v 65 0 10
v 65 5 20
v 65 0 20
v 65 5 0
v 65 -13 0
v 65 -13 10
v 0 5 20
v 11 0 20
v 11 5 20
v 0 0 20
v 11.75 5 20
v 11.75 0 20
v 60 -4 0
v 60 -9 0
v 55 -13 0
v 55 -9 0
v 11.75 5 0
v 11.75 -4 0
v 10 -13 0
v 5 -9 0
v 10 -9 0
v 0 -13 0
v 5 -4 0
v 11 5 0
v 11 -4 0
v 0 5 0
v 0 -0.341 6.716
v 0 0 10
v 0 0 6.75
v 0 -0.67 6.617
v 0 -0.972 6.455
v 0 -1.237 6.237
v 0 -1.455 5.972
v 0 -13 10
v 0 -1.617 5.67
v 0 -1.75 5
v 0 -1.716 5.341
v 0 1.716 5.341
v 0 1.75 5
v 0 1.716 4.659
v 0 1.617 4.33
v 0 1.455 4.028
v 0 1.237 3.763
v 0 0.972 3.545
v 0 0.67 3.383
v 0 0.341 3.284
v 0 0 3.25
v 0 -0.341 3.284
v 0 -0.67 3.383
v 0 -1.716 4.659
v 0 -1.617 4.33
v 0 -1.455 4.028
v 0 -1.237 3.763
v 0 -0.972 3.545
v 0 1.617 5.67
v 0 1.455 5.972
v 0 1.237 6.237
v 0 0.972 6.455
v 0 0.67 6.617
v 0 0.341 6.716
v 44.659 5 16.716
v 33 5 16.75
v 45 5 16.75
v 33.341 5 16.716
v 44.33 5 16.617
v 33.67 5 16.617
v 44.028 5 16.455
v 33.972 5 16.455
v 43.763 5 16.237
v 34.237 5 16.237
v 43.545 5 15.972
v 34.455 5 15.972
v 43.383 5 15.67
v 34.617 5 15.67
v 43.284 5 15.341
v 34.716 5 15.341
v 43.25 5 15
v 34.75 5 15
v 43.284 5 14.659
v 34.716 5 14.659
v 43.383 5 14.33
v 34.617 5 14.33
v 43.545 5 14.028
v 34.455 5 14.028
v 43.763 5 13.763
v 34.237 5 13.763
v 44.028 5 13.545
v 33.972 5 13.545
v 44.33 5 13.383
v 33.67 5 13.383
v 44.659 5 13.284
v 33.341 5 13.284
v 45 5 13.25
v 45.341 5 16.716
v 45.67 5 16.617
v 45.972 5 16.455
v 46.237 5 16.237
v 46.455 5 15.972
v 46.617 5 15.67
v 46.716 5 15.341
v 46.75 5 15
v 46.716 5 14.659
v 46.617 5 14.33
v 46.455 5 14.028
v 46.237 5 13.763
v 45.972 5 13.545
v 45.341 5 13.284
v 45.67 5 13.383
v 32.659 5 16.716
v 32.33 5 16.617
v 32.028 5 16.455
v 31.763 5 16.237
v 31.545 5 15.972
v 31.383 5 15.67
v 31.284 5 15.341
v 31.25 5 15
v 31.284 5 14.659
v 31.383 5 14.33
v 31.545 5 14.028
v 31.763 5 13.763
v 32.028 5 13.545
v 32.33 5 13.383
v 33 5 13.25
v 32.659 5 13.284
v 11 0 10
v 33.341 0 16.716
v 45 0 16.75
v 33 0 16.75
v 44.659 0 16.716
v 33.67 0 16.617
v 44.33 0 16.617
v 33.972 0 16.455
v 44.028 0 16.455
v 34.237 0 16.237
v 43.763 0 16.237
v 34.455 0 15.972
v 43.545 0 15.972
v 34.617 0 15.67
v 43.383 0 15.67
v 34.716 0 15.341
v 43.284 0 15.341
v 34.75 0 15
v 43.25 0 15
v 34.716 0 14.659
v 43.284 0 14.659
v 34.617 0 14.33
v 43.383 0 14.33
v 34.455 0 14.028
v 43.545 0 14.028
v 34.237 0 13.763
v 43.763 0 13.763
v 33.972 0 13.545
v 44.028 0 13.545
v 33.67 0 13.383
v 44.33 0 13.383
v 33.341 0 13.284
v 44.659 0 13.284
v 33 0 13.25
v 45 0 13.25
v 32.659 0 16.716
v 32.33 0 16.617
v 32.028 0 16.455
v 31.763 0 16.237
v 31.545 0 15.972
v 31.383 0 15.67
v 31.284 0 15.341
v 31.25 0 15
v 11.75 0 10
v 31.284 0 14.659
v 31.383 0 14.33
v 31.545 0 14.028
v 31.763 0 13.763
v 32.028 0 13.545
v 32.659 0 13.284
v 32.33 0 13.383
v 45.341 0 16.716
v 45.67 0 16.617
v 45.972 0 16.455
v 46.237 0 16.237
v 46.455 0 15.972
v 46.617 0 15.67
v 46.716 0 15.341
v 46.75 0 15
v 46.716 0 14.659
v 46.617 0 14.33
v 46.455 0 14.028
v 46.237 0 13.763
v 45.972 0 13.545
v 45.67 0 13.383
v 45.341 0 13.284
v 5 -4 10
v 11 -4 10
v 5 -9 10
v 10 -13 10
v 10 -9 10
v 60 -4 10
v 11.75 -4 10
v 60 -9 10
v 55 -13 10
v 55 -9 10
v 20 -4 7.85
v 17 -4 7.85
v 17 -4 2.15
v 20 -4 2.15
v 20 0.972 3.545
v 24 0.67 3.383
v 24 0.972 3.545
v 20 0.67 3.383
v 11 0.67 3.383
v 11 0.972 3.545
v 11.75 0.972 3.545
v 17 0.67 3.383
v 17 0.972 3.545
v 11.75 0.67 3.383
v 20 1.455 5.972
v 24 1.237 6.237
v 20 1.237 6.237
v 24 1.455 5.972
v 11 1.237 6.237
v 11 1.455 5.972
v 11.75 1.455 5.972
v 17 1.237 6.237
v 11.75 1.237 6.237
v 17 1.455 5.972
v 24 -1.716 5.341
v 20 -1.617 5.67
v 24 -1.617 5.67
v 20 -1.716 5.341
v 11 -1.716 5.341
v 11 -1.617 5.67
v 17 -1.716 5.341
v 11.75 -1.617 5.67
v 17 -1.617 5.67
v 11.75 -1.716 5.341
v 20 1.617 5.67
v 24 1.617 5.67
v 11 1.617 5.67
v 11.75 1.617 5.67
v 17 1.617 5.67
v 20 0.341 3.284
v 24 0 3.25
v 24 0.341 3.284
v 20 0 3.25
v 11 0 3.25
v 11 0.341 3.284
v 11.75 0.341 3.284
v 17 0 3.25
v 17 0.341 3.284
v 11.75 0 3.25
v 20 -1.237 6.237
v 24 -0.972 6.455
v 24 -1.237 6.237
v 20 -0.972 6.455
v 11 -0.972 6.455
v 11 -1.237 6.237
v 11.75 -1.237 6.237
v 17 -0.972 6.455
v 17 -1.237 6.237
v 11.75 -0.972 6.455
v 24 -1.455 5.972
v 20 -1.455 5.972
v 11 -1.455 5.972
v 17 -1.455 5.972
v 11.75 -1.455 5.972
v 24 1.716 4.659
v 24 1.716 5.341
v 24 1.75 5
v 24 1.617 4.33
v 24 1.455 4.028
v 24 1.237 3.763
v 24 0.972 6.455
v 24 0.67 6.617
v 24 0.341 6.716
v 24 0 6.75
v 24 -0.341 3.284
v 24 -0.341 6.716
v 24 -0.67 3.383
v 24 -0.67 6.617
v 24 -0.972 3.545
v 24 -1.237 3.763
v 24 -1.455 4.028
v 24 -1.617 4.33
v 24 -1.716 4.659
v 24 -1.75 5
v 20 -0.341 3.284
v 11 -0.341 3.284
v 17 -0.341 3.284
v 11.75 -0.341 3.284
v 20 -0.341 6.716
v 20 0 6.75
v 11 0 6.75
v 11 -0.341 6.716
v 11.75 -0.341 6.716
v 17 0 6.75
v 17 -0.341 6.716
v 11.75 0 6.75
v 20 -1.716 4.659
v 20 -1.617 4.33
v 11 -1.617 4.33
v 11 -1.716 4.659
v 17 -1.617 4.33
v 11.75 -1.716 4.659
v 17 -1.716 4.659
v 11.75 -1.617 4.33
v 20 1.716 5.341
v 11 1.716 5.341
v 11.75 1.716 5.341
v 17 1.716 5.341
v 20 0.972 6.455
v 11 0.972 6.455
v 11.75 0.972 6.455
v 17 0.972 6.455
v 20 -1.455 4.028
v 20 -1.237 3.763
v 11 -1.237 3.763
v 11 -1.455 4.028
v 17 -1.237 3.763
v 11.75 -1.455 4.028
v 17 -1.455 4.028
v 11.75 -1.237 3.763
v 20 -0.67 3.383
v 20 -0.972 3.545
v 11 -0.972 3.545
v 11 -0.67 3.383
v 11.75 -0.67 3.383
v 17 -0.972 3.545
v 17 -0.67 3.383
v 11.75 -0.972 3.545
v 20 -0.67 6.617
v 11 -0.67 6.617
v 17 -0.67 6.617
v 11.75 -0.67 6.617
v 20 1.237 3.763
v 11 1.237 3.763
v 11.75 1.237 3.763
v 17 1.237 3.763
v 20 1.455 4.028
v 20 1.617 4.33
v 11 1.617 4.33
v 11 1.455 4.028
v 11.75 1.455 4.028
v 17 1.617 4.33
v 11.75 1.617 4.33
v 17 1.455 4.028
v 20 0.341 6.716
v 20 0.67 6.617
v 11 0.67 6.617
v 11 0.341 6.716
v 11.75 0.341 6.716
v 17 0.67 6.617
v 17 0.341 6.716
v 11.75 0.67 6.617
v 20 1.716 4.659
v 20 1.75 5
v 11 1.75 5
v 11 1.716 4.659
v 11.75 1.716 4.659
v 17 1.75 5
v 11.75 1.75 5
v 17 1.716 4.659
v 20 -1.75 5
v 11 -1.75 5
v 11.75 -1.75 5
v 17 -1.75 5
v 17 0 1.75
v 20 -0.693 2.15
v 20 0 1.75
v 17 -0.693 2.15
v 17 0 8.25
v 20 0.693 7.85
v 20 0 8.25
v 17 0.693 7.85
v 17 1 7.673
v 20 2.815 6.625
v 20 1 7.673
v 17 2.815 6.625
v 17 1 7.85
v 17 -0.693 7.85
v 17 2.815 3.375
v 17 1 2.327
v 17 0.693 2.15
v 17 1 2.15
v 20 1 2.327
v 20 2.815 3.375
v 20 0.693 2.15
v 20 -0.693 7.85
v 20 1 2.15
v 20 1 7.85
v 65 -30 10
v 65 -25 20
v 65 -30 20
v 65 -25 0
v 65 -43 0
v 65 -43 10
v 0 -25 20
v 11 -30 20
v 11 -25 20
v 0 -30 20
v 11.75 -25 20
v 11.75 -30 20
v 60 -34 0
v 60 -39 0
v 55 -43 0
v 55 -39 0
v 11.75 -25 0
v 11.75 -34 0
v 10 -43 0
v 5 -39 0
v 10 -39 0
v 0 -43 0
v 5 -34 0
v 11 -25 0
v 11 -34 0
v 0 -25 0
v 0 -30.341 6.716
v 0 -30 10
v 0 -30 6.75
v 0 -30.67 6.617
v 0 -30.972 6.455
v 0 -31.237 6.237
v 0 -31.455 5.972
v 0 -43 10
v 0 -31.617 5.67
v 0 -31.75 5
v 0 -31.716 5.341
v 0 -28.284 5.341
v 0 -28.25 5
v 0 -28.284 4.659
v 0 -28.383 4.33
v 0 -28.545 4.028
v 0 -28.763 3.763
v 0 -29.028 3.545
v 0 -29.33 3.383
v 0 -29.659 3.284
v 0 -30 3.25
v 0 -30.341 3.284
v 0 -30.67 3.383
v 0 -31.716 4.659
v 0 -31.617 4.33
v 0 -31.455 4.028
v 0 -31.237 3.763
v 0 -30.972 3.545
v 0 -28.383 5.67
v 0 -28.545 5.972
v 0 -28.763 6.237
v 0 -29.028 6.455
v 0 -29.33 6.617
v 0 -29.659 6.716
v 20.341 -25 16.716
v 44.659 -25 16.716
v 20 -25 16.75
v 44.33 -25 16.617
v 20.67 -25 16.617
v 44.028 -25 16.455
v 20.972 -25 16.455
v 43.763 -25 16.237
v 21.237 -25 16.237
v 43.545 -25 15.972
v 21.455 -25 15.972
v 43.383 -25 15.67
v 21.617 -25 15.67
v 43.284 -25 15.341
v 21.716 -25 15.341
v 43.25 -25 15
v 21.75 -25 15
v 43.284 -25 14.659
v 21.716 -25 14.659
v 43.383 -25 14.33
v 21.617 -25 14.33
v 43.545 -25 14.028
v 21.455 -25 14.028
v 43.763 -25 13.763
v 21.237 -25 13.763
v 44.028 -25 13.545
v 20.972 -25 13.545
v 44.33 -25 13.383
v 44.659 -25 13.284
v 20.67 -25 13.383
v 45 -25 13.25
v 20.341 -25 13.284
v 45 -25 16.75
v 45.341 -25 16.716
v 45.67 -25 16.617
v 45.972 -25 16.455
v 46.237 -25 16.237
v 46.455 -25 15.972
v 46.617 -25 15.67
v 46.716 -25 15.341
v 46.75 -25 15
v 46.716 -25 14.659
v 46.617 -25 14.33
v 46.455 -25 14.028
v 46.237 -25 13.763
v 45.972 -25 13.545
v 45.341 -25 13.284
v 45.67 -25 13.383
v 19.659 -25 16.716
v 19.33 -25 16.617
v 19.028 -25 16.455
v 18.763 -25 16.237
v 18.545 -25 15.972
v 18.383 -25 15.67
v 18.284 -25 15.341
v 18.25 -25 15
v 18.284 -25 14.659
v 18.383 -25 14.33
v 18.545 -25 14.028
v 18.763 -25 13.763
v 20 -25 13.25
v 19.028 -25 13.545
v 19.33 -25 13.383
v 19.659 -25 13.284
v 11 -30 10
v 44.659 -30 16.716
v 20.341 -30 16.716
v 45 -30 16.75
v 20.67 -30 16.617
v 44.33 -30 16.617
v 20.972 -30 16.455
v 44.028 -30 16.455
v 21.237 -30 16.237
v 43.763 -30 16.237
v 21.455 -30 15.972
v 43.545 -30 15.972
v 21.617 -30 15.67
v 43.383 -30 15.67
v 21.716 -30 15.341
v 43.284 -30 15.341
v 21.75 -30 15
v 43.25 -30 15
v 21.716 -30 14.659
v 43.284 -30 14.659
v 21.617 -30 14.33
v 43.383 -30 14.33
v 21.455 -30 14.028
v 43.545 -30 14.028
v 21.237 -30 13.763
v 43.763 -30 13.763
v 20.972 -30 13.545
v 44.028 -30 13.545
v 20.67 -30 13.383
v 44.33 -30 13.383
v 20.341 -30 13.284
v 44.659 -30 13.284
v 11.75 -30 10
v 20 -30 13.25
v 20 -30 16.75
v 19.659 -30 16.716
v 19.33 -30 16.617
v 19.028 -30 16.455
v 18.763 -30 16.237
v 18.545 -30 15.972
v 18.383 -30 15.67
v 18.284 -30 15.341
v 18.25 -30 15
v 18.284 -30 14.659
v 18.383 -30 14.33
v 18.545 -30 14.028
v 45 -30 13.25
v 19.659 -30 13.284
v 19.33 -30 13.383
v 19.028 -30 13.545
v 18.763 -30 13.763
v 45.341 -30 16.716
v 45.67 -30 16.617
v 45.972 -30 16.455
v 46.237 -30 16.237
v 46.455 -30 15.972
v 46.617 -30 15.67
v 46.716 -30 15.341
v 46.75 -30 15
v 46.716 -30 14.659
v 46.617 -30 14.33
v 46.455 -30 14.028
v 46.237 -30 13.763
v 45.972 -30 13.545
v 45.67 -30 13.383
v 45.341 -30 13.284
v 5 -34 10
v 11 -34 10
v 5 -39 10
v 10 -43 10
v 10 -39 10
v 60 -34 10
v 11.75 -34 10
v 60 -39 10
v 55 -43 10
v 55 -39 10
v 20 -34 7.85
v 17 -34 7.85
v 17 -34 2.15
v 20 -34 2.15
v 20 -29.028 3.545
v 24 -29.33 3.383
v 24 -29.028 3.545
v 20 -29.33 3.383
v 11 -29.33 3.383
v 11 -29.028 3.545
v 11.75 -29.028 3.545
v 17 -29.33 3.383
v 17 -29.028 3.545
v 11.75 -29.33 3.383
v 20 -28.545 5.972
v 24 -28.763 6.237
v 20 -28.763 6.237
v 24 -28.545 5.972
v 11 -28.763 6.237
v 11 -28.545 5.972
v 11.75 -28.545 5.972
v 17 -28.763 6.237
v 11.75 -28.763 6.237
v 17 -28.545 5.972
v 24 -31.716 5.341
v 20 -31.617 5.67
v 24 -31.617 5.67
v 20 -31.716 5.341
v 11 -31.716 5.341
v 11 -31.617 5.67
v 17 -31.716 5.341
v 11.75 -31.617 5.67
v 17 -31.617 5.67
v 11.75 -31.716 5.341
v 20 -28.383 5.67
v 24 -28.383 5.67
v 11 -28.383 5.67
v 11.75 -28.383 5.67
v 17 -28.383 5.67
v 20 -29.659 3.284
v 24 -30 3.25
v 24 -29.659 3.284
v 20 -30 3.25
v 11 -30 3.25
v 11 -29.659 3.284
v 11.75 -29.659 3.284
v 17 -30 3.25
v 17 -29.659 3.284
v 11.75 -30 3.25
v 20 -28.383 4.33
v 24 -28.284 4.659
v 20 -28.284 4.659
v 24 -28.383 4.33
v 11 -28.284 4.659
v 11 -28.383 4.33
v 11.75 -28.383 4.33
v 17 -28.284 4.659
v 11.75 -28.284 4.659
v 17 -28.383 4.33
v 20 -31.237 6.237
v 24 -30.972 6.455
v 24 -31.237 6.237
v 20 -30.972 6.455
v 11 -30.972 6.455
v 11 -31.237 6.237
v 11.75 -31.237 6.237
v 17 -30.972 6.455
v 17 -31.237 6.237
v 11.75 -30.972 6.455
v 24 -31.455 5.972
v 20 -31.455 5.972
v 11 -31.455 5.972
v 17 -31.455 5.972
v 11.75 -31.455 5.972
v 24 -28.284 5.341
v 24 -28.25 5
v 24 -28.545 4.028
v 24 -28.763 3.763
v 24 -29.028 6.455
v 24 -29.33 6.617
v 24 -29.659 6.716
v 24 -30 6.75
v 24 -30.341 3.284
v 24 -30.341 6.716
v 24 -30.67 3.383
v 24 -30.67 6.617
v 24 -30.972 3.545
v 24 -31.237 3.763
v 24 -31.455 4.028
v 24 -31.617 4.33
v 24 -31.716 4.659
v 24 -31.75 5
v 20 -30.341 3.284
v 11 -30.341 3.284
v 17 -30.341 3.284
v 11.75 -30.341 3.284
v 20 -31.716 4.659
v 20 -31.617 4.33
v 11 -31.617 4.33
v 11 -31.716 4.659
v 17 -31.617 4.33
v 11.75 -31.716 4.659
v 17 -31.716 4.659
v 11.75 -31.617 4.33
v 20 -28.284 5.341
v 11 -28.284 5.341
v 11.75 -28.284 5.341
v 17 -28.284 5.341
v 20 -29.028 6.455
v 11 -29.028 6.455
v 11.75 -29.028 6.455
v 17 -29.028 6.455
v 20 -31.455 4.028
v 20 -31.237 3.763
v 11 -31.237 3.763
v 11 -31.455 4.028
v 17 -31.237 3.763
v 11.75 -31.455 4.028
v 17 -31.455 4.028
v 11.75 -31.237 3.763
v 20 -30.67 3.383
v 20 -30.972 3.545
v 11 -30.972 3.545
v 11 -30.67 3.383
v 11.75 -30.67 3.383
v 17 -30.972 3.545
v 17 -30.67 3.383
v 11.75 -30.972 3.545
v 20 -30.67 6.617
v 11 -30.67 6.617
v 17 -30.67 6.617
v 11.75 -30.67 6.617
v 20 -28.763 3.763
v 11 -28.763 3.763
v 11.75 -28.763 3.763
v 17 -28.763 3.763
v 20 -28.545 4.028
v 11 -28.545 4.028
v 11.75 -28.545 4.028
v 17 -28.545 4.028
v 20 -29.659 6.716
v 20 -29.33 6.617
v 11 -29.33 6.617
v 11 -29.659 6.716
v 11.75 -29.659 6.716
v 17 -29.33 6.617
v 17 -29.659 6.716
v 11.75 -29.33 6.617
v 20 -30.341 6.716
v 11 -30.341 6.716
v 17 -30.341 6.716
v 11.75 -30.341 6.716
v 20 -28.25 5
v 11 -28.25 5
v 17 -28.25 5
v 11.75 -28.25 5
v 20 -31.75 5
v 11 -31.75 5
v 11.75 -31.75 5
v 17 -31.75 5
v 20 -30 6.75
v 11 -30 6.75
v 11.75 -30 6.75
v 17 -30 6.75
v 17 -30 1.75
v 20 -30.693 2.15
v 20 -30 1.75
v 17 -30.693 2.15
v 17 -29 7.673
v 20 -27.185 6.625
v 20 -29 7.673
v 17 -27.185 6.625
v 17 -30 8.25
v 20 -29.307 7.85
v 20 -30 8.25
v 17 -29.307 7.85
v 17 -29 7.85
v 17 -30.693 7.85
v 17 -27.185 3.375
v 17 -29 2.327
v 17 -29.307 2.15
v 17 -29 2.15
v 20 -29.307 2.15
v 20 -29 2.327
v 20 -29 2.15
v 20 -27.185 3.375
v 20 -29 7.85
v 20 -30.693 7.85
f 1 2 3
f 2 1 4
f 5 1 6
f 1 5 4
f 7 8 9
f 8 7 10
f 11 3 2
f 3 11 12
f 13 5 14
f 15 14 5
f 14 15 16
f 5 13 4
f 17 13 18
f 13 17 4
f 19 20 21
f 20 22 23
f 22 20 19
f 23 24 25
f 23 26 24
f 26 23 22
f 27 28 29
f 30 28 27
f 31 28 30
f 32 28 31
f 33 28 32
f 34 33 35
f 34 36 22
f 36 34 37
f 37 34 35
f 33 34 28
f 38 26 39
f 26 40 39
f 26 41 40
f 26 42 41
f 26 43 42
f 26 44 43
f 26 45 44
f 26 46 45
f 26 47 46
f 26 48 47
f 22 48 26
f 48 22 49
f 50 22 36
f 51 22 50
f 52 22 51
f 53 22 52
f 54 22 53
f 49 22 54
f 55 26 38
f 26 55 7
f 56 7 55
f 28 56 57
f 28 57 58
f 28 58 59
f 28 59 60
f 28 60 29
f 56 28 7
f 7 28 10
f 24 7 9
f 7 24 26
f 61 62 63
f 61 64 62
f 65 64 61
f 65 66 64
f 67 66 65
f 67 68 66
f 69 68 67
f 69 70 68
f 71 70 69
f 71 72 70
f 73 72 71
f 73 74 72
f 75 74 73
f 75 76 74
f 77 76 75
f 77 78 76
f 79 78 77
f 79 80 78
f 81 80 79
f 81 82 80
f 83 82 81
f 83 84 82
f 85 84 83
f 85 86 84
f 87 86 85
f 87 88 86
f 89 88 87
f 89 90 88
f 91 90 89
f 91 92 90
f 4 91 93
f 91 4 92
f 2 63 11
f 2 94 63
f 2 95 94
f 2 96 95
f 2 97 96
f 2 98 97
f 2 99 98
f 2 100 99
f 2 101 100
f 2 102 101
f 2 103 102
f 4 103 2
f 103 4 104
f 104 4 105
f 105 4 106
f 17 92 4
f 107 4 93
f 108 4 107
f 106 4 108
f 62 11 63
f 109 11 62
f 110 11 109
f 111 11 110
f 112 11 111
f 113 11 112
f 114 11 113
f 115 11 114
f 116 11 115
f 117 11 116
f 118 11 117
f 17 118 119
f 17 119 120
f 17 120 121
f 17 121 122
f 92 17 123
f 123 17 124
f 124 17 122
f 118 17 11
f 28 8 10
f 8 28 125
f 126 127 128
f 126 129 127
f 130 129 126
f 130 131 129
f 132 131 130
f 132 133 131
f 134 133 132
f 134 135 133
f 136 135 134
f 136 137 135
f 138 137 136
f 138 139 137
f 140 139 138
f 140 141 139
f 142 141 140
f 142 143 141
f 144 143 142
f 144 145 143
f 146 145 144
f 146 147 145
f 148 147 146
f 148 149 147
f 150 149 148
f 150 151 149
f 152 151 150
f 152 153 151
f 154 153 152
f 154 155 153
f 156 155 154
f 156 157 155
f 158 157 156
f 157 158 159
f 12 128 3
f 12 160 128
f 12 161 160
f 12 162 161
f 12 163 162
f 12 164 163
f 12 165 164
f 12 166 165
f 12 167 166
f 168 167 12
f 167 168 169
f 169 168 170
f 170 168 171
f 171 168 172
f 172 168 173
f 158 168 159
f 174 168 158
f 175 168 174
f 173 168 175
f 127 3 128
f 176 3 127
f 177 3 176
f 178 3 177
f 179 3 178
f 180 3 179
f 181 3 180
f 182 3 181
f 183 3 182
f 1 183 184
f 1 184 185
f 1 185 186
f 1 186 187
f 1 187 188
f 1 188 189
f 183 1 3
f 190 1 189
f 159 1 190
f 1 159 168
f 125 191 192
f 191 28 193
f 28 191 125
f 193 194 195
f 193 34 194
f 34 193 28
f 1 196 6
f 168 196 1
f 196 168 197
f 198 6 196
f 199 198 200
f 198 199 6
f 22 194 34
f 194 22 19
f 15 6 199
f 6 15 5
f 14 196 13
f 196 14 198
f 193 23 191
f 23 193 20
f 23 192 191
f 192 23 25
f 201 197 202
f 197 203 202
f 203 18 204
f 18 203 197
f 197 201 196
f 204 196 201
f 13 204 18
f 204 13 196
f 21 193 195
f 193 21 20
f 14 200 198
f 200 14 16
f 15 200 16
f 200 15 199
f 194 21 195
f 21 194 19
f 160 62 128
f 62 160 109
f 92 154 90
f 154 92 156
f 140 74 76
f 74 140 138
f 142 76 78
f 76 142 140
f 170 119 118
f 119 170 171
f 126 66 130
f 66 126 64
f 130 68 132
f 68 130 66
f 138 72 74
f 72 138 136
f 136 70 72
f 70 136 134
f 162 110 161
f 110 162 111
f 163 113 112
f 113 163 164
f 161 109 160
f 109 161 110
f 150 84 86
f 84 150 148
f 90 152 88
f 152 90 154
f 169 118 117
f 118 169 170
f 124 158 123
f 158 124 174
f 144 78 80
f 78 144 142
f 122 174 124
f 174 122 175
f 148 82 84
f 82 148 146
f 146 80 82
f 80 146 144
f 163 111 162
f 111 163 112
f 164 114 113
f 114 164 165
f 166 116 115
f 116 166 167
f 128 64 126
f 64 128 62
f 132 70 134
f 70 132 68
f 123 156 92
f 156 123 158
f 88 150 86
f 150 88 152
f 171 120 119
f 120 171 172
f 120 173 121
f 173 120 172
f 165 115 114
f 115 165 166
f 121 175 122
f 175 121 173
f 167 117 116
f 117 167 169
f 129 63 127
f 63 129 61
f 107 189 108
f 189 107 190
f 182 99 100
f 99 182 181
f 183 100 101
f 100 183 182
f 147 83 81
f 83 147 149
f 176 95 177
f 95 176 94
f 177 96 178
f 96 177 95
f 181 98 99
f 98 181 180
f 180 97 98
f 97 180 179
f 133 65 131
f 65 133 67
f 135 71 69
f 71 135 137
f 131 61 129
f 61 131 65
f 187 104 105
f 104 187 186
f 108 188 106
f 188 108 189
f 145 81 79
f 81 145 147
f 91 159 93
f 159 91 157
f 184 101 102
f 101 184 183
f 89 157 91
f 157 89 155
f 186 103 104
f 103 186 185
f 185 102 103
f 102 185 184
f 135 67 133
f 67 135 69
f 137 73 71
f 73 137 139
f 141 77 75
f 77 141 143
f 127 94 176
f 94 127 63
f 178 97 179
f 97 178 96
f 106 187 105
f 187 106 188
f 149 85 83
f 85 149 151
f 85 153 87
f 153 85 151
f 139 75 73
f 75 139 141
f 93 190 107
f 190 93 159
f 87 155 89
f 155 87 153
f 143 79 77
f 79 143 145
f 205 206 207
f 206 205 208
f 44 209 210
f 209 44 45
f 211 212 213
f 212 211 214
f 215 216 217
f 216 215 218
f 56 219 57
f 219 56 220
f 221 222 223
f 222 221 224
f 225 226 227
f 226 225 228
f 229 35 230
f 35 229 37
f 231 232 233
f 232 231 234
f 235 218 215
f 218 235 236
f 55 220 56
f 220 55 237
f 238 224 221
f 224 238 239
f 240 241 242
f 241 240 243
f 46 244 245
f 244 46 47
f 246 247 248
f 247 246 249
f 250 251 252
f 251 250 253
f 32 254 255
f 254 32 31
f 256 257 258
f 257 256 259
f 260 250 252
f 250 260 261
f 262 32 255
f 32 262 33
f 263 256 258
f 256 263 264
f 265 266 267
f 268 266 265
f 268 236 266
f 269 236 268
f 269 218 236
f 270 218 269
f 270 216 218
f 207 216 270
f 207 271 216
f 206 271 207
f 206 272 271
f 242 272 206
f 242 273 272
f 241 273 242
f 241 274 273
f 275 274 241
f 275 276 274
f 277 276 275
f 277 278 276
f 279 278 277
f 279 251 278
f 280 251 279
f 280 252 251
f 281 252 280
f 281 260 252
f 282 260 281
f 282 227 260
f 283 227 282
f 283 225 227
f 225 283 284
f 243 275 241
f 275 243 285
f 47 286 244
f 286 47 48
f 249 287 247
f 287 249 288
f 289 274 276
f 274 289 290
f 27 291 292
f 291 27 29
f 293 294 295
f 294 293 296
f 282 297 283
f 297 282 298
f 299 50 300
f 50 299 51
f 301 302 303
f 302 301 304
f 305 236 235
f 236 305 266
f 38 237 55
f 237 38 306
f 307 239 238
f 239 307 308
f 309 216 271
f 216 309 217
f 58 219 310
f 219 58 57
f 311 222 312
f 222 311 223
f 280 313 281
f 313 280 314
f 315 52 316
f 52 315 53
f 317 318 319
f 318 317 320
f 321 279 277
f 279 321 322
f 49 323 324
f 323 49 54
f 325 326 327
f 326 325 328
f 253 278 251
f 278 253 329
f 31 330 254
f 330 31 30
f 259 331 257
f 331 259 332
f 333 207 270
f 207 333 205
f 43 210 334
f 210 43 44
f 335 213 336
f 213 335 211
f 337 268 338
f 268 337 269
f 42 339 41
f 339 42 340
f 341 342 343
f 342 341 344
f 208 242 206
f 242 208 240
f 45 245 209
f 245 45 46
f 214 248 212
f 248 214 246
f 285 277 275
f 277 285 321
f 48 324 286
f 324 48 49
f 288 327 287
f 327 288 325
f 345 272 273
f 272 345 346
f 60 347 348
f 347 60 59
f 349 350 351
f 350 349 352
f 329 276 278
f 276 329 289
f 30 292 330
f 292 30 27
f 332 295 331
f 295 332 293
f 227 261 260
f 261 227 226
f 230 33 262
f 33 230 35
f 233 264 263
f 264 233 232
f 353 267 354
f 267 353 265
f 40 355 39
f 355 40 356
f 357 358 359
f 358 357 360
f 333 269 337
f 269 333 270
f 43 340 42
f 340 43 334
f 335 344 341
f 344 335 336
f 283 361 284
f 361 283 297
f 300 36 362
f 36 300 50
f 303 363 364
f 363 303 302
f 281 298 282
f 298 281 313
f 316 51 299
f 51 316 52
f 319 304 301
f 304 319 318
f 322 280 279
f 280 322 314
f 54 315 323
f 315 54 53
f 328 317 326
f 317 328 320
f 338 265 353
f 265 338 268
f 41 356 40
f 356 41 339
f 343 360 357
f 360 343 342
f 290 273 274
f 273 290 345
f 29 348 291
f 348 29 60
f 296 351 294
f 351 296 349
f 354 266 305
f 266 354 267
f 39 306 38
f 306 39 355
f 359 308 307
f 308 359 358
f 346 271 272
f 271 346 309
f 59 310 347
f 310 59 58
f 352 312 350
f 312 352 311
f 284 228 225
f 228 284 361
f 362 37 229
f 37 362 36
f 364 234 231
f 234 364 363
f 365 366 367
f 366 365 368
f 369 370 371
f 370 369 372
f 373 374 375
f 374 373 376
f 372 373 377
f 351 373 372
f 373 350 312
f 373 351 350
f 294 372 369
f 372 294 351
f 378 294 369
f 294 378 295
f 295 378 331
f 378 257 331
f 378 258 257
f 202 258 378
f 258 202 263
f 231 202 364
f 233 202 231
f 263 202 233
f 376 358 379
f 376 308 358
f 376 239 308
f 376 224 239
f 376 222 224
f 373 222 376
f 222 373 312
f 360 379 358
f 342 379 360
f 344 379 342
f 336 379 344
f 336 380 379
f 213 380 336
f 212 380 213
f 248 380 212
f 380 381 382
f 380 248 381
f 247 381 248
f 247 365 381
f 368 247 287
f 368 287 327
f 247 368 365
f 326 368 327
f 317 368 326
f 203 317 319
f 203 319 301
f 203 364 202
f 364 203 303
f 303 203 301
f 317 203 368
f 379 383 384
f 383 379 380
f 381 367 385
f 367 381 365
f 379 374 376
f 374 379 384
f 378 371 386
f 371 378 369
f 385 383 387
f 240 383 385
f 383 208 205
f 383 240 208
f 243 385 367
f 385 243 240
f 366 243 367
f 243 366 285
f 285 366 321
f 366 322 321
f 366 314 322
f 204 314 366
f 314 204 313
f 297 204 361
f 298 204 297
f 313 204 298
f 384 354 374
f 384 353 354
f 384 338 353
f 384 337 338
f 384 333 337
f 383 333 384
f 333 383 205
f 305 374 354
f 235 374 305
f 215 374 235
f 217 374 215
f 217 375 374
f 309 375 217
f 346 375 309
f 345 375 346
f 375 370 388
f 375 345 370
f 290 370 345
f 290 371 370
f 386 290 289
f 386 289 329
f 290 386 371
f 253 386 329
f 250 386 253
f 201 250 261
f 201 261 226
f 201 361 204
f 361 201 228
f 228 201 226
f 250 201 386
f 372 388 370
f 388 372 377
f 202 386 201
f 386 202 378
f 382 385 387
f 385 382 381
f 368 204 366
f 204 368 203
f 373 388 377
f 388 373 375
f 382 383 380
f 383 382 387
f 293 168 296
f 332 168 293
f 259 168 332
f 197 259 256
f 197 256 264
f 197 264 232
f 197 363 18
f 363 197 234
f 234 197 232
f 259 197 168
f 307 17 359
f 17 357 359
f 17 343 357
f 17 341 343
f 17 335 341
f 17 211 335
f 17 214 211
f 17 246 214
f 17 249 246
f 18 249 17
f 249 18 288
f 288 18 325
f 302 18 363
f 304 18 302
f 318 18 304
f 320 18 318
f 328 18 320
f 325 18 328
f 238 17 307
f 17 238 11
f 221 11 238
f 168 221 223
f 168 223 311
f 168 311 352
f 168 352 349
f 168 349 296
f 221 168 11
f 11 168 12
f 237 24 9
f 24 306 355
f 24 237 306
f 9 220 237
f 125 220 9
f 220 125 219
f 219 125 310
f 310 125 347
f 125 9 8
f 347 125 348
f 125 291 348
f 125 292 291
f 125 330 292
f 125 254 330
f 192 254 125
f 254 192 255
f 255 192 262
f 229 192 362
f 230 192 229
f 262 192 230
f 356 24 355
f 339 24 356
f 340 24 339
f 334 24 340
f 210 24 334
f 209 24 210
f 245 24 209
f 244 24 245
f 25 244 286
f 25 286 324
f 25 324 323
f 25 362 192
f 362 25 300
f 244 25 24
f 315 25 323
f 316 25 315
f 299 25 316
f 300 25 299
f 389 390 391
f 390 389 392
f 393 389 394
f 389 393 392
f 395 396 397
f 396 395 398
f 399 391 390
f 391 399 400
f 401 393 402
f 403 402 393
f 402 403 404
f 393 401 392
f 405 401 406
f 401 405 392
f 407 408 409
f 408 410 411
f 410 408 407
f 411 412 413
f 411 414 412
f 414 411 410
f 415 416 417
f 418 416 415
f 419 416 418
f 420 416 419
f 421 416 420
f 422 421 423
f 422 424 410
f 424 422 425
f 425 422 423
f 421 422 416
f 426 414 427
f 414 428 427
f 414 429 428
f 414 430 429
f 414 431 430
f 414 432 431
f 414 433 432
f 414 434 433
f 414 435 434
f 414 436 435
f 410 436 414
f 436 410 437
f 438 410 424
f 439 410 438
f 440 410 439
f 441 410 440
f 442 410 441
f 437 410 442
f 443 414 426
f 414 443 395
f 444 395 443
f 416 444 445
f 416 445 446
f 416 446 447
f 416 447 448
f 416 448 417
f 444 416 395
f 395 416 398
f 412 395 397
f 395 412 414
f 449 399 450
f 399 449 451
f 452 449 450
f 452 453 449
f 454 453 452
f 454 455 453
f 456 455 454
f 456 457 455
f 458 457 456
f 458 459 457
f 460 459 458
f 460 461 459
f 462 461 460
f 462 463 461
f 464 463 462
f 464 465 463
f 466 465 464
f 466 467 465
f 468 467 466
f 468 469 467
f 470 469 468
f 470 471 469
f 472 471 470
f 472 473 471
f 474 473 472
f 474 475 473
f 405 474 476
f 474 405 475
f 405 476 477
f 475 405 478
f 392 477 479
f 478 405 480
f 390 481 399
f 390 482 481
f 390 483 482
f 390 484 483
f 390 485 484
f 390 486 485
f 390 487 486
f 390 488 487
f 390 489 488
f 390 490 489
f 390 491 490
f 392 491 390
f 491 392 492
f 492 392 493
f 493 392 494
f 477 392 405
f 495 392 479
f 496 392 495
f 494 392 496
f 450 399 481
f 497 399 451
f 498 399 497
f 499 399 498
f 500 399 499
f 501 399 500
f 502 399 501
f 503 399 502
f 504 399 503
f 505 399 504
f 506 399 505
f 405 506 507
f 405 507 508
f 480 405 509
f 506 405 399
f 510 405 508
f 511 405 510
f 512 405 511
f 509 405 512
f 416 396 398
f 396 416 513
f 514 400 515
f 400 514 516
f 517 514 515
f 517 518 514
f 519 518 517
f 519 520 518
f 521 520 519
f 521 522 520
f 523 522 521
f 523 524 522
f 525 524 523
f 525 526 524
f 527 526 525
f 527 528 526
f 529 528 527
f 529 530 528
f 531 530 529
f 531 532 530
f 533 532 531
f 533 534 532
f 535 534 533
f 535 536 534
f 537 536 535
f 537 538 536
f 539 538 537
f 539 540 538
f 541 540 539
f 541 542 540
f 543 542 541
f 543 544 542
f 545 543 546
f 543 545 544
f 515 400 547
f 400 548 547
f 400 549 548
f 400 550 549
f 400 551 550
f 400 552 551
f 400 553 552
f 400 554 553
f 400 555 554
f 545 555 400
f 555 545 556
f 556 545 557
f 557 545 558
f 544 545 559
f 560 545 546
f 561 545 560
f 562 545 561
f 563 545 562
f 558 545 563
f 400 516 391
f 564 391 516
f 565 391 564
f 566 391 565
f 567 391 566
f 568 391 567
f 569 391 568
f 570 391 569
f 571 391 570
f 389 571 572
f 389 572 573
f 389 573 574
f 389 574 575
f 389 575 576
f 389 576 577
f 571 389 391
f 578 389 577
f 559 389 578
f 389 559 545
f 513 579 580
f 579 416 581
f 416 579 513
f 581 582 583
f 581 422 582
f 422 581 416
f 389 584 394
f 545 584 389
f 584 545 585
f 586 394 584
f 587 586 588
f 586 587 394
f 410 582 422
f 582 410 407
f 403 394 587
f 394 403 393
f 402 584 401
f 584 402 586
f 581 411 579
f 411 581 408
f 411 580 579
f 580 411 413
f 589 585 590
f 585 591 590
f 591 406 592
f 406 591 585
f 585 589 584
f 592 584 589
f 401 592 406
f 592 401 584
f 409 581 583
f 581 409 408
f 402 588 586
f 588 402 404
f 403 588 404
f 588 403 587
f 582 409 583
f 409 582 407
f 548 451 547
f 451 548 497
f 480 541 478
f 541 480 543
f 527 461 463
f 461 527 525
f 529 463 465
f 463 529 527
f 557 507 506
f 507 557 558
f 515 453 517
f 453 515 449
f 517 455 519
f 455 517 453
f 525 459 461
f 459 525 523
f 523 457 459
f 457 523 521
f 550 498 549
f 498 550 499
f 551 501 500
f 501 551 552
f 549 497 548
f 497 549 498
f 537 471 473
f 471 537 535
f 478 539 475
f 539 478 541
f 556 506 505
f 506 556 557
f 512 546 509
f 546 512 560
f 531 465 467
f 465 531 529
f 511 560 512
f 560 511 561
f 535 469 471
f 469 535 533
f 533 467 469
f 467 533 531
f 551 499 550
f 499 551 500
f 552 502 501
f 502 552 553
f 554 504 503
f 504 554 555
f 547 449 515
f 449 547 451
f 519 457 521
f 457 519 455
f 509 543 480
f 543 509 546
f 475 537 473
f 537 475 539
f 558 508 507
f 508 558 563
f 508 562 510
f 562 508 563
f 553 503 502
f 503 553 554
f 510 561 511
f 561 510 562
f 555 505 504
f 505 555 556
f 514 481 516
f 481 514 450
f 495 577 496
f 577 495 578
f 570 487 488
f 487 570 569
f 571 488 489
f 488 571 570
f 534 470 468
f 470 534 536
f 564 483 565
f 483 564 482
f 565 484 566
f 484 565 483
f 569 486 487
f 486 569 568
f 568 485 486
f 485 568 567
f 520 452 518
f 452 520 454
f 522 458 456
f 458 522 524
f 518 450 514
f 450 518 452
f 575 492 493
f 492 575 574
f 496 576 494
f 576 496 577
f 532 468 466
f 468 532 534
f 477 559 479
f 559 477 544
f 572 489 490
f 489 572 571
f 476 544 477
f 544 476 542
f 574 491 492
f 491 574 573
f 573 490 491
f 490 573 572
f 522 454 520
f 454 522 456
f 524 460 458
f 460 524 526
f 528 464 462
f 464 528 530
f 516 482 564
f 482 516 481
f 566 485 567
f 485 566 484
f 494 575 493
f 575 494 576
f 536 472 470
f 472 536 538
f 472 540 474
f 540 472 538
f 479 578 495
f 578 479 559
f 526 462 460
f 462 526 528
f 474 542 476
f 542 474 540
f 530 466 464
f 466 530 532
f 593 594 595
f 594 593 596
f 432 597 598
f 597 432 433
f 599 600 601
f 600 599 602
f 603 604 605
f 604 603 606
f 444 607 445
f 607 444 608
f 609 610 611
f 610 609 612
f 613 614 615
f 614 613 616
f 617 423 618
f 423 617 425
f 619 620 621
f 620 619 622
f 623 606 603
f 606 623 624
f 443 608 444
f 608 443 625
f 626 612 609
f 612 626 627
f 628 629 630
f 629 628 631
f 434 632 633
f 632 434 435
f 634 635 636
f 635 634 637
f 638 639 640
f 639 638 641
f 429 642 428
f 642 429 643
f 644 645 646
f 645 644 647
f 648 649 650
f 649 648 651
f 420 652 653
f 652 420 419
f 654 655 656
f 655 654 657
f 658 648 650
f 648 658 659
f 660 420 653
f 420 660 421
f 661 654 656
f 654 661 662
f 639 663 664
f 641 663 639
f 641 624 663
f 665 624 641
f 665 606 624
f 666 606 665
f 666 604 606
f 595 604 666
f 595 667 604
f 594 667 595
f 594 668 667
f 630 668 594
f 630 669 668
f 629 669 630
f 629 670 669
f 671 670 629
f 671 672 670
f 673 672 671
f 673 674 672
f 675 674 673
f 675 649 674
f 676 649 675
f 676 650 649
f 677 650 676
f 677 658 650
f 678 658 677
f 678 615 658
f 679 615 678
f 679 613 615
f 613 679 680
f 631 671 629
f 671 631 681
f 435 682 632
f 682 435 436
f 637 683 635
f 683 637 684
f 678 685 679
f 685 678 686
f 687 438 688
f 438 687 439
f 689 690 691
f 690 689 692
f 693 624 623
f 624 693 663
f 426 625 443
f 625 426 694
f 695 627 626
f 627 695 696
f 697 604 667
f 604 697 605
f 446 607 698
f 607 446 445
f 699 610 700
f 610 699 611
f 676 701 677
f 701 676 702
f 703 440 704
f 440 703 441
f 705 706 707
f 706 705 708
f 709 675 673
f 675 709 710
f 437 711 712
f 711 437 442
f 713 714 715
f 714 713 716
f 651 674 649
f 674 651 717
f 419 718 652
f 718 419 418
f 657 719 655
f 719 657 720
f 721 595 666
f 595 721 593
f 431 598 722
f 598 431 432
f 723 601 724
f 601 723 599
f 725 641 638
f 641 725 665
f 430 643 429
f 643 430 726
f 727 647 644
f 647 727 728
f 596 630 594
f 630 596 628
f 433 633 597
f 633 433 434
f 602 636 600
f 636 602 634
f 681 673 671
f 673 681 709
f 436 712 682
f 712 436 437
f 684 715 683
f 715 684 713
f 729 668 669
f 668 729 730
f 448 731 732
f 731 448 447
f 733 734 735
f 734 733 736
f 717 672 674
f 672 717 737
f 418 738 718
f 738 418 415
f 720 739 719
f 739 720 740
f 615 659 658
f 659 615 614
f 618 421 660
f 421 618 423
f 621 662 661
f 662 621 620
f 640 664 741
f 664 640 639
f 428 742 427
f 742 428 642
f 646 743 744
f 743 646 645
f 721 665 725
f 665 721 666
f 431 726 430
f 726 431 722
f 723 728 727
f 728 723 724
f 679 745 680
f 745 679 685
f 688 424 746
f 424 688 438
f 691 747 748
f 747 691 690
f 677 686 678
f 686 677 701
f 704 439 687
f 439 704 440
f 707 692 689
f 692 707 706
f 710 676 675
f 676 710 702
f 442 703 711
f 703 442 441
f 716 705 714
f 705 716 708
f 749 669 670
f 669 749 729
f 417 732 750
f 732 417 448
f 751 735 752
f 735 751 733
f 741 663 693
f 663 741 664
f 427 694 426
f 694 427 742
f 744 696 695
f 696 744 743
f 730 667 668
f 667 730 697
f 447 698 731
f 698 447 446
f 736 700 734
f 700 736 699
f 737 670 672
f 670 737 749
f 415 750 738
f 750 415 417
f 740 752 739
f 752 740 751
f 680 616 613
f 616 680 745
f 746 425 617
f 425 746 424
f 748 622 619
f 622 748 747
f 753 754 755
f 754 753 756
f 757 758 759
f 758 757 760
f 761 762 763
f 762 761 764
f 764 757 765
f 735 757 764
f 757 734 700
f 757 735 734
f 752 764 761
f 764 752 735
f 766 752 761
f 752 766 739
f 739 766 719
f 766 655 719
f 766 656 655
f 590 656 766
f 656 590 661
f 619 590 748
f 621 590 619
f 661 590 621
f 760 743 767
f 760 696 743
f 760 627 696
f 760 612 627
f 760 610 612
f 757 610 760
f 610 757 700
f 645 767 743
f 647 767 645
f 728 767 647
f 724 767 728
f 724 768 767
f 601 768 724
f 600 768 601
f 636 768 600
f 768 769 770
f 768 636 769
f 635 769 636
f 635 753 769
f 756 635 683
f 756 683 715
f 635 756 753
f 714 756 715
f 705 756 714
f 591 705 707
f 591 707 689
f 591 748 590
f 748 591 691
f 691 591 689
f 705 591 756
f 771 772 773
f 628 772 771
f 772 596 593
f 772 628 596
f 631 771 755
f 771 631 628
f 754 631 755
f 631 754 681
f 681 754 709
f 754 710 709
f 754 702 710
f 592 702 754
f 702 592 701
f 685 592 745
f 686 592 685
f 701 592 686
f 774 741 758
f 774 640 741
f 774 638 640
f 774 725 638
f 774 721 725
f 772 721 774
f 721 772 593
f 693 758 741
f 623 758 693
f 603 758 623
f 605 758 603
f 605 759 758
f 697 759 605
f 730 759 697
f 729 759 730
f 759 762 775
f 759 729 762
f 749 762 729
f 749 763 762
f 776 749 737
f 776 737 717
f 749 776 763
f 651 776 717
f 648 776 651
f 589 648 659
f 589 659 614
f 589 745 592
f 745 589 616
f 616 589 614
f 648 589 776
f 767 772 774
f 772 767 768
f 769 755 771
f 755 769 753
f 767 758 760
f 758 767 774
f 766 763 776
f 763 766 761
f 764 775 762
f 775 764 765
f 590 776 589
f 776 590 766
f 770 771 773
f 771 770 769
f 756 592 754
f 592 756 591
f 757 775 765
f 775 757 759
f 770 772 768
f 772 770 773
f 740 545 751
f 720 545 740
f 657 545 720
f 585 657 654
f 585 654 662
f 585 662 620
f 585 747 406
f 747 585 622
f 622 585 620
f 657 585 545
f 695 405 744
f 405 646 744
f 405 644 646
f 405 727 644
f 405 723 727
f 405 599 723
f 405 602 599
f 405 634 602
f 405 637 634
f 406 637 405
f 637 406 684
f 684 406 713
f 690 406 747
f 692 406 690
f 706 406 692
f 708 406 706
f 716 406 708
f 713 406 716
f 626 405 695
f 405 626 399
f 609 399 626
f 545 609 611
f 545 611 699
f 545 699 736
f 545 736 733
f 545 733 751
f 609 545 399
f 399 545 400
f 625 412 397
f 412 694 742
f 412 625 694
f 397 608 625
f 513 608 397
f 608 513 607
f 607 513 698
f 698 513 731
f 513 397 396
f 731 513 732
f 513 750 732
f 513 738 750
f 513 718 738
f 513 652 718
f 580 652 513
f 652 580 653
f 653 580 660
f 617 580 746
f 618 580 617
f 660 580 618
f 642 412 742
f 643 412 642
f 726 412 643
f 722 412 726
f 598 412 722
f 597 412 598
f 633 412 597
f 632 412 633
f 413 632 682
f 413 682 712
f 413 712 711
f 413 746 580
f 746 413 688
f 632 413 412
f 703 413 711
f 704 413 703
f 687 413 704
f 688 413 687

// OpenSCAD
// star parameters
frame_thickness = 5;
// end parameters

//12
//25

m3_diameter = 3.75;
m3_nut_diameter = 6.3;
original_frame_thickness = 7;
y_margin = original_frame_thickness - frame_thickness;

module psu_clamp(holeDistance = 25) {
  thickness=5;
  difference() {
    union() {
      // PSU side
      cube([65,thickness,20]);
      translate([0,-15 + y_margin,0]) cube([65,15 - y_margin,10]);
    }
    // cutout for frame
    translate([5,-11 + y_margin,0]) cube([55,frame_thickness,10]);
    translate([10,-21 + y_margin,0]) cube([45,10,10]);
    // hole for PSU mount
    translate([45 - holeDistance,7,15]) rotate([90,0,0]) cylinder(10,1.75,1.75,$fn=32);
    translate([45,7,15]) rotate([90,0,0]) cylinder(10,1.75,1.75,$fn=32);
    // bolt for clamp and nut trap
    translate([-1,0,5]) rotate([0,90,0]) cylinder(25,1.75,1.75,$fn=32);
    translate([17,0,5]) rotate([0,90,0]) cylinder(3,3.25,3.25,$fn=6);
    translate([17,-9,2.15]) cube([3,10,5.7]);
    translate([11,-10,0]) cube([0.75,40,20]);
  }
}

psu_clamp(12);  // bottom clamp
translate([0,-30,0]) psu_clamp(); // top clamp
